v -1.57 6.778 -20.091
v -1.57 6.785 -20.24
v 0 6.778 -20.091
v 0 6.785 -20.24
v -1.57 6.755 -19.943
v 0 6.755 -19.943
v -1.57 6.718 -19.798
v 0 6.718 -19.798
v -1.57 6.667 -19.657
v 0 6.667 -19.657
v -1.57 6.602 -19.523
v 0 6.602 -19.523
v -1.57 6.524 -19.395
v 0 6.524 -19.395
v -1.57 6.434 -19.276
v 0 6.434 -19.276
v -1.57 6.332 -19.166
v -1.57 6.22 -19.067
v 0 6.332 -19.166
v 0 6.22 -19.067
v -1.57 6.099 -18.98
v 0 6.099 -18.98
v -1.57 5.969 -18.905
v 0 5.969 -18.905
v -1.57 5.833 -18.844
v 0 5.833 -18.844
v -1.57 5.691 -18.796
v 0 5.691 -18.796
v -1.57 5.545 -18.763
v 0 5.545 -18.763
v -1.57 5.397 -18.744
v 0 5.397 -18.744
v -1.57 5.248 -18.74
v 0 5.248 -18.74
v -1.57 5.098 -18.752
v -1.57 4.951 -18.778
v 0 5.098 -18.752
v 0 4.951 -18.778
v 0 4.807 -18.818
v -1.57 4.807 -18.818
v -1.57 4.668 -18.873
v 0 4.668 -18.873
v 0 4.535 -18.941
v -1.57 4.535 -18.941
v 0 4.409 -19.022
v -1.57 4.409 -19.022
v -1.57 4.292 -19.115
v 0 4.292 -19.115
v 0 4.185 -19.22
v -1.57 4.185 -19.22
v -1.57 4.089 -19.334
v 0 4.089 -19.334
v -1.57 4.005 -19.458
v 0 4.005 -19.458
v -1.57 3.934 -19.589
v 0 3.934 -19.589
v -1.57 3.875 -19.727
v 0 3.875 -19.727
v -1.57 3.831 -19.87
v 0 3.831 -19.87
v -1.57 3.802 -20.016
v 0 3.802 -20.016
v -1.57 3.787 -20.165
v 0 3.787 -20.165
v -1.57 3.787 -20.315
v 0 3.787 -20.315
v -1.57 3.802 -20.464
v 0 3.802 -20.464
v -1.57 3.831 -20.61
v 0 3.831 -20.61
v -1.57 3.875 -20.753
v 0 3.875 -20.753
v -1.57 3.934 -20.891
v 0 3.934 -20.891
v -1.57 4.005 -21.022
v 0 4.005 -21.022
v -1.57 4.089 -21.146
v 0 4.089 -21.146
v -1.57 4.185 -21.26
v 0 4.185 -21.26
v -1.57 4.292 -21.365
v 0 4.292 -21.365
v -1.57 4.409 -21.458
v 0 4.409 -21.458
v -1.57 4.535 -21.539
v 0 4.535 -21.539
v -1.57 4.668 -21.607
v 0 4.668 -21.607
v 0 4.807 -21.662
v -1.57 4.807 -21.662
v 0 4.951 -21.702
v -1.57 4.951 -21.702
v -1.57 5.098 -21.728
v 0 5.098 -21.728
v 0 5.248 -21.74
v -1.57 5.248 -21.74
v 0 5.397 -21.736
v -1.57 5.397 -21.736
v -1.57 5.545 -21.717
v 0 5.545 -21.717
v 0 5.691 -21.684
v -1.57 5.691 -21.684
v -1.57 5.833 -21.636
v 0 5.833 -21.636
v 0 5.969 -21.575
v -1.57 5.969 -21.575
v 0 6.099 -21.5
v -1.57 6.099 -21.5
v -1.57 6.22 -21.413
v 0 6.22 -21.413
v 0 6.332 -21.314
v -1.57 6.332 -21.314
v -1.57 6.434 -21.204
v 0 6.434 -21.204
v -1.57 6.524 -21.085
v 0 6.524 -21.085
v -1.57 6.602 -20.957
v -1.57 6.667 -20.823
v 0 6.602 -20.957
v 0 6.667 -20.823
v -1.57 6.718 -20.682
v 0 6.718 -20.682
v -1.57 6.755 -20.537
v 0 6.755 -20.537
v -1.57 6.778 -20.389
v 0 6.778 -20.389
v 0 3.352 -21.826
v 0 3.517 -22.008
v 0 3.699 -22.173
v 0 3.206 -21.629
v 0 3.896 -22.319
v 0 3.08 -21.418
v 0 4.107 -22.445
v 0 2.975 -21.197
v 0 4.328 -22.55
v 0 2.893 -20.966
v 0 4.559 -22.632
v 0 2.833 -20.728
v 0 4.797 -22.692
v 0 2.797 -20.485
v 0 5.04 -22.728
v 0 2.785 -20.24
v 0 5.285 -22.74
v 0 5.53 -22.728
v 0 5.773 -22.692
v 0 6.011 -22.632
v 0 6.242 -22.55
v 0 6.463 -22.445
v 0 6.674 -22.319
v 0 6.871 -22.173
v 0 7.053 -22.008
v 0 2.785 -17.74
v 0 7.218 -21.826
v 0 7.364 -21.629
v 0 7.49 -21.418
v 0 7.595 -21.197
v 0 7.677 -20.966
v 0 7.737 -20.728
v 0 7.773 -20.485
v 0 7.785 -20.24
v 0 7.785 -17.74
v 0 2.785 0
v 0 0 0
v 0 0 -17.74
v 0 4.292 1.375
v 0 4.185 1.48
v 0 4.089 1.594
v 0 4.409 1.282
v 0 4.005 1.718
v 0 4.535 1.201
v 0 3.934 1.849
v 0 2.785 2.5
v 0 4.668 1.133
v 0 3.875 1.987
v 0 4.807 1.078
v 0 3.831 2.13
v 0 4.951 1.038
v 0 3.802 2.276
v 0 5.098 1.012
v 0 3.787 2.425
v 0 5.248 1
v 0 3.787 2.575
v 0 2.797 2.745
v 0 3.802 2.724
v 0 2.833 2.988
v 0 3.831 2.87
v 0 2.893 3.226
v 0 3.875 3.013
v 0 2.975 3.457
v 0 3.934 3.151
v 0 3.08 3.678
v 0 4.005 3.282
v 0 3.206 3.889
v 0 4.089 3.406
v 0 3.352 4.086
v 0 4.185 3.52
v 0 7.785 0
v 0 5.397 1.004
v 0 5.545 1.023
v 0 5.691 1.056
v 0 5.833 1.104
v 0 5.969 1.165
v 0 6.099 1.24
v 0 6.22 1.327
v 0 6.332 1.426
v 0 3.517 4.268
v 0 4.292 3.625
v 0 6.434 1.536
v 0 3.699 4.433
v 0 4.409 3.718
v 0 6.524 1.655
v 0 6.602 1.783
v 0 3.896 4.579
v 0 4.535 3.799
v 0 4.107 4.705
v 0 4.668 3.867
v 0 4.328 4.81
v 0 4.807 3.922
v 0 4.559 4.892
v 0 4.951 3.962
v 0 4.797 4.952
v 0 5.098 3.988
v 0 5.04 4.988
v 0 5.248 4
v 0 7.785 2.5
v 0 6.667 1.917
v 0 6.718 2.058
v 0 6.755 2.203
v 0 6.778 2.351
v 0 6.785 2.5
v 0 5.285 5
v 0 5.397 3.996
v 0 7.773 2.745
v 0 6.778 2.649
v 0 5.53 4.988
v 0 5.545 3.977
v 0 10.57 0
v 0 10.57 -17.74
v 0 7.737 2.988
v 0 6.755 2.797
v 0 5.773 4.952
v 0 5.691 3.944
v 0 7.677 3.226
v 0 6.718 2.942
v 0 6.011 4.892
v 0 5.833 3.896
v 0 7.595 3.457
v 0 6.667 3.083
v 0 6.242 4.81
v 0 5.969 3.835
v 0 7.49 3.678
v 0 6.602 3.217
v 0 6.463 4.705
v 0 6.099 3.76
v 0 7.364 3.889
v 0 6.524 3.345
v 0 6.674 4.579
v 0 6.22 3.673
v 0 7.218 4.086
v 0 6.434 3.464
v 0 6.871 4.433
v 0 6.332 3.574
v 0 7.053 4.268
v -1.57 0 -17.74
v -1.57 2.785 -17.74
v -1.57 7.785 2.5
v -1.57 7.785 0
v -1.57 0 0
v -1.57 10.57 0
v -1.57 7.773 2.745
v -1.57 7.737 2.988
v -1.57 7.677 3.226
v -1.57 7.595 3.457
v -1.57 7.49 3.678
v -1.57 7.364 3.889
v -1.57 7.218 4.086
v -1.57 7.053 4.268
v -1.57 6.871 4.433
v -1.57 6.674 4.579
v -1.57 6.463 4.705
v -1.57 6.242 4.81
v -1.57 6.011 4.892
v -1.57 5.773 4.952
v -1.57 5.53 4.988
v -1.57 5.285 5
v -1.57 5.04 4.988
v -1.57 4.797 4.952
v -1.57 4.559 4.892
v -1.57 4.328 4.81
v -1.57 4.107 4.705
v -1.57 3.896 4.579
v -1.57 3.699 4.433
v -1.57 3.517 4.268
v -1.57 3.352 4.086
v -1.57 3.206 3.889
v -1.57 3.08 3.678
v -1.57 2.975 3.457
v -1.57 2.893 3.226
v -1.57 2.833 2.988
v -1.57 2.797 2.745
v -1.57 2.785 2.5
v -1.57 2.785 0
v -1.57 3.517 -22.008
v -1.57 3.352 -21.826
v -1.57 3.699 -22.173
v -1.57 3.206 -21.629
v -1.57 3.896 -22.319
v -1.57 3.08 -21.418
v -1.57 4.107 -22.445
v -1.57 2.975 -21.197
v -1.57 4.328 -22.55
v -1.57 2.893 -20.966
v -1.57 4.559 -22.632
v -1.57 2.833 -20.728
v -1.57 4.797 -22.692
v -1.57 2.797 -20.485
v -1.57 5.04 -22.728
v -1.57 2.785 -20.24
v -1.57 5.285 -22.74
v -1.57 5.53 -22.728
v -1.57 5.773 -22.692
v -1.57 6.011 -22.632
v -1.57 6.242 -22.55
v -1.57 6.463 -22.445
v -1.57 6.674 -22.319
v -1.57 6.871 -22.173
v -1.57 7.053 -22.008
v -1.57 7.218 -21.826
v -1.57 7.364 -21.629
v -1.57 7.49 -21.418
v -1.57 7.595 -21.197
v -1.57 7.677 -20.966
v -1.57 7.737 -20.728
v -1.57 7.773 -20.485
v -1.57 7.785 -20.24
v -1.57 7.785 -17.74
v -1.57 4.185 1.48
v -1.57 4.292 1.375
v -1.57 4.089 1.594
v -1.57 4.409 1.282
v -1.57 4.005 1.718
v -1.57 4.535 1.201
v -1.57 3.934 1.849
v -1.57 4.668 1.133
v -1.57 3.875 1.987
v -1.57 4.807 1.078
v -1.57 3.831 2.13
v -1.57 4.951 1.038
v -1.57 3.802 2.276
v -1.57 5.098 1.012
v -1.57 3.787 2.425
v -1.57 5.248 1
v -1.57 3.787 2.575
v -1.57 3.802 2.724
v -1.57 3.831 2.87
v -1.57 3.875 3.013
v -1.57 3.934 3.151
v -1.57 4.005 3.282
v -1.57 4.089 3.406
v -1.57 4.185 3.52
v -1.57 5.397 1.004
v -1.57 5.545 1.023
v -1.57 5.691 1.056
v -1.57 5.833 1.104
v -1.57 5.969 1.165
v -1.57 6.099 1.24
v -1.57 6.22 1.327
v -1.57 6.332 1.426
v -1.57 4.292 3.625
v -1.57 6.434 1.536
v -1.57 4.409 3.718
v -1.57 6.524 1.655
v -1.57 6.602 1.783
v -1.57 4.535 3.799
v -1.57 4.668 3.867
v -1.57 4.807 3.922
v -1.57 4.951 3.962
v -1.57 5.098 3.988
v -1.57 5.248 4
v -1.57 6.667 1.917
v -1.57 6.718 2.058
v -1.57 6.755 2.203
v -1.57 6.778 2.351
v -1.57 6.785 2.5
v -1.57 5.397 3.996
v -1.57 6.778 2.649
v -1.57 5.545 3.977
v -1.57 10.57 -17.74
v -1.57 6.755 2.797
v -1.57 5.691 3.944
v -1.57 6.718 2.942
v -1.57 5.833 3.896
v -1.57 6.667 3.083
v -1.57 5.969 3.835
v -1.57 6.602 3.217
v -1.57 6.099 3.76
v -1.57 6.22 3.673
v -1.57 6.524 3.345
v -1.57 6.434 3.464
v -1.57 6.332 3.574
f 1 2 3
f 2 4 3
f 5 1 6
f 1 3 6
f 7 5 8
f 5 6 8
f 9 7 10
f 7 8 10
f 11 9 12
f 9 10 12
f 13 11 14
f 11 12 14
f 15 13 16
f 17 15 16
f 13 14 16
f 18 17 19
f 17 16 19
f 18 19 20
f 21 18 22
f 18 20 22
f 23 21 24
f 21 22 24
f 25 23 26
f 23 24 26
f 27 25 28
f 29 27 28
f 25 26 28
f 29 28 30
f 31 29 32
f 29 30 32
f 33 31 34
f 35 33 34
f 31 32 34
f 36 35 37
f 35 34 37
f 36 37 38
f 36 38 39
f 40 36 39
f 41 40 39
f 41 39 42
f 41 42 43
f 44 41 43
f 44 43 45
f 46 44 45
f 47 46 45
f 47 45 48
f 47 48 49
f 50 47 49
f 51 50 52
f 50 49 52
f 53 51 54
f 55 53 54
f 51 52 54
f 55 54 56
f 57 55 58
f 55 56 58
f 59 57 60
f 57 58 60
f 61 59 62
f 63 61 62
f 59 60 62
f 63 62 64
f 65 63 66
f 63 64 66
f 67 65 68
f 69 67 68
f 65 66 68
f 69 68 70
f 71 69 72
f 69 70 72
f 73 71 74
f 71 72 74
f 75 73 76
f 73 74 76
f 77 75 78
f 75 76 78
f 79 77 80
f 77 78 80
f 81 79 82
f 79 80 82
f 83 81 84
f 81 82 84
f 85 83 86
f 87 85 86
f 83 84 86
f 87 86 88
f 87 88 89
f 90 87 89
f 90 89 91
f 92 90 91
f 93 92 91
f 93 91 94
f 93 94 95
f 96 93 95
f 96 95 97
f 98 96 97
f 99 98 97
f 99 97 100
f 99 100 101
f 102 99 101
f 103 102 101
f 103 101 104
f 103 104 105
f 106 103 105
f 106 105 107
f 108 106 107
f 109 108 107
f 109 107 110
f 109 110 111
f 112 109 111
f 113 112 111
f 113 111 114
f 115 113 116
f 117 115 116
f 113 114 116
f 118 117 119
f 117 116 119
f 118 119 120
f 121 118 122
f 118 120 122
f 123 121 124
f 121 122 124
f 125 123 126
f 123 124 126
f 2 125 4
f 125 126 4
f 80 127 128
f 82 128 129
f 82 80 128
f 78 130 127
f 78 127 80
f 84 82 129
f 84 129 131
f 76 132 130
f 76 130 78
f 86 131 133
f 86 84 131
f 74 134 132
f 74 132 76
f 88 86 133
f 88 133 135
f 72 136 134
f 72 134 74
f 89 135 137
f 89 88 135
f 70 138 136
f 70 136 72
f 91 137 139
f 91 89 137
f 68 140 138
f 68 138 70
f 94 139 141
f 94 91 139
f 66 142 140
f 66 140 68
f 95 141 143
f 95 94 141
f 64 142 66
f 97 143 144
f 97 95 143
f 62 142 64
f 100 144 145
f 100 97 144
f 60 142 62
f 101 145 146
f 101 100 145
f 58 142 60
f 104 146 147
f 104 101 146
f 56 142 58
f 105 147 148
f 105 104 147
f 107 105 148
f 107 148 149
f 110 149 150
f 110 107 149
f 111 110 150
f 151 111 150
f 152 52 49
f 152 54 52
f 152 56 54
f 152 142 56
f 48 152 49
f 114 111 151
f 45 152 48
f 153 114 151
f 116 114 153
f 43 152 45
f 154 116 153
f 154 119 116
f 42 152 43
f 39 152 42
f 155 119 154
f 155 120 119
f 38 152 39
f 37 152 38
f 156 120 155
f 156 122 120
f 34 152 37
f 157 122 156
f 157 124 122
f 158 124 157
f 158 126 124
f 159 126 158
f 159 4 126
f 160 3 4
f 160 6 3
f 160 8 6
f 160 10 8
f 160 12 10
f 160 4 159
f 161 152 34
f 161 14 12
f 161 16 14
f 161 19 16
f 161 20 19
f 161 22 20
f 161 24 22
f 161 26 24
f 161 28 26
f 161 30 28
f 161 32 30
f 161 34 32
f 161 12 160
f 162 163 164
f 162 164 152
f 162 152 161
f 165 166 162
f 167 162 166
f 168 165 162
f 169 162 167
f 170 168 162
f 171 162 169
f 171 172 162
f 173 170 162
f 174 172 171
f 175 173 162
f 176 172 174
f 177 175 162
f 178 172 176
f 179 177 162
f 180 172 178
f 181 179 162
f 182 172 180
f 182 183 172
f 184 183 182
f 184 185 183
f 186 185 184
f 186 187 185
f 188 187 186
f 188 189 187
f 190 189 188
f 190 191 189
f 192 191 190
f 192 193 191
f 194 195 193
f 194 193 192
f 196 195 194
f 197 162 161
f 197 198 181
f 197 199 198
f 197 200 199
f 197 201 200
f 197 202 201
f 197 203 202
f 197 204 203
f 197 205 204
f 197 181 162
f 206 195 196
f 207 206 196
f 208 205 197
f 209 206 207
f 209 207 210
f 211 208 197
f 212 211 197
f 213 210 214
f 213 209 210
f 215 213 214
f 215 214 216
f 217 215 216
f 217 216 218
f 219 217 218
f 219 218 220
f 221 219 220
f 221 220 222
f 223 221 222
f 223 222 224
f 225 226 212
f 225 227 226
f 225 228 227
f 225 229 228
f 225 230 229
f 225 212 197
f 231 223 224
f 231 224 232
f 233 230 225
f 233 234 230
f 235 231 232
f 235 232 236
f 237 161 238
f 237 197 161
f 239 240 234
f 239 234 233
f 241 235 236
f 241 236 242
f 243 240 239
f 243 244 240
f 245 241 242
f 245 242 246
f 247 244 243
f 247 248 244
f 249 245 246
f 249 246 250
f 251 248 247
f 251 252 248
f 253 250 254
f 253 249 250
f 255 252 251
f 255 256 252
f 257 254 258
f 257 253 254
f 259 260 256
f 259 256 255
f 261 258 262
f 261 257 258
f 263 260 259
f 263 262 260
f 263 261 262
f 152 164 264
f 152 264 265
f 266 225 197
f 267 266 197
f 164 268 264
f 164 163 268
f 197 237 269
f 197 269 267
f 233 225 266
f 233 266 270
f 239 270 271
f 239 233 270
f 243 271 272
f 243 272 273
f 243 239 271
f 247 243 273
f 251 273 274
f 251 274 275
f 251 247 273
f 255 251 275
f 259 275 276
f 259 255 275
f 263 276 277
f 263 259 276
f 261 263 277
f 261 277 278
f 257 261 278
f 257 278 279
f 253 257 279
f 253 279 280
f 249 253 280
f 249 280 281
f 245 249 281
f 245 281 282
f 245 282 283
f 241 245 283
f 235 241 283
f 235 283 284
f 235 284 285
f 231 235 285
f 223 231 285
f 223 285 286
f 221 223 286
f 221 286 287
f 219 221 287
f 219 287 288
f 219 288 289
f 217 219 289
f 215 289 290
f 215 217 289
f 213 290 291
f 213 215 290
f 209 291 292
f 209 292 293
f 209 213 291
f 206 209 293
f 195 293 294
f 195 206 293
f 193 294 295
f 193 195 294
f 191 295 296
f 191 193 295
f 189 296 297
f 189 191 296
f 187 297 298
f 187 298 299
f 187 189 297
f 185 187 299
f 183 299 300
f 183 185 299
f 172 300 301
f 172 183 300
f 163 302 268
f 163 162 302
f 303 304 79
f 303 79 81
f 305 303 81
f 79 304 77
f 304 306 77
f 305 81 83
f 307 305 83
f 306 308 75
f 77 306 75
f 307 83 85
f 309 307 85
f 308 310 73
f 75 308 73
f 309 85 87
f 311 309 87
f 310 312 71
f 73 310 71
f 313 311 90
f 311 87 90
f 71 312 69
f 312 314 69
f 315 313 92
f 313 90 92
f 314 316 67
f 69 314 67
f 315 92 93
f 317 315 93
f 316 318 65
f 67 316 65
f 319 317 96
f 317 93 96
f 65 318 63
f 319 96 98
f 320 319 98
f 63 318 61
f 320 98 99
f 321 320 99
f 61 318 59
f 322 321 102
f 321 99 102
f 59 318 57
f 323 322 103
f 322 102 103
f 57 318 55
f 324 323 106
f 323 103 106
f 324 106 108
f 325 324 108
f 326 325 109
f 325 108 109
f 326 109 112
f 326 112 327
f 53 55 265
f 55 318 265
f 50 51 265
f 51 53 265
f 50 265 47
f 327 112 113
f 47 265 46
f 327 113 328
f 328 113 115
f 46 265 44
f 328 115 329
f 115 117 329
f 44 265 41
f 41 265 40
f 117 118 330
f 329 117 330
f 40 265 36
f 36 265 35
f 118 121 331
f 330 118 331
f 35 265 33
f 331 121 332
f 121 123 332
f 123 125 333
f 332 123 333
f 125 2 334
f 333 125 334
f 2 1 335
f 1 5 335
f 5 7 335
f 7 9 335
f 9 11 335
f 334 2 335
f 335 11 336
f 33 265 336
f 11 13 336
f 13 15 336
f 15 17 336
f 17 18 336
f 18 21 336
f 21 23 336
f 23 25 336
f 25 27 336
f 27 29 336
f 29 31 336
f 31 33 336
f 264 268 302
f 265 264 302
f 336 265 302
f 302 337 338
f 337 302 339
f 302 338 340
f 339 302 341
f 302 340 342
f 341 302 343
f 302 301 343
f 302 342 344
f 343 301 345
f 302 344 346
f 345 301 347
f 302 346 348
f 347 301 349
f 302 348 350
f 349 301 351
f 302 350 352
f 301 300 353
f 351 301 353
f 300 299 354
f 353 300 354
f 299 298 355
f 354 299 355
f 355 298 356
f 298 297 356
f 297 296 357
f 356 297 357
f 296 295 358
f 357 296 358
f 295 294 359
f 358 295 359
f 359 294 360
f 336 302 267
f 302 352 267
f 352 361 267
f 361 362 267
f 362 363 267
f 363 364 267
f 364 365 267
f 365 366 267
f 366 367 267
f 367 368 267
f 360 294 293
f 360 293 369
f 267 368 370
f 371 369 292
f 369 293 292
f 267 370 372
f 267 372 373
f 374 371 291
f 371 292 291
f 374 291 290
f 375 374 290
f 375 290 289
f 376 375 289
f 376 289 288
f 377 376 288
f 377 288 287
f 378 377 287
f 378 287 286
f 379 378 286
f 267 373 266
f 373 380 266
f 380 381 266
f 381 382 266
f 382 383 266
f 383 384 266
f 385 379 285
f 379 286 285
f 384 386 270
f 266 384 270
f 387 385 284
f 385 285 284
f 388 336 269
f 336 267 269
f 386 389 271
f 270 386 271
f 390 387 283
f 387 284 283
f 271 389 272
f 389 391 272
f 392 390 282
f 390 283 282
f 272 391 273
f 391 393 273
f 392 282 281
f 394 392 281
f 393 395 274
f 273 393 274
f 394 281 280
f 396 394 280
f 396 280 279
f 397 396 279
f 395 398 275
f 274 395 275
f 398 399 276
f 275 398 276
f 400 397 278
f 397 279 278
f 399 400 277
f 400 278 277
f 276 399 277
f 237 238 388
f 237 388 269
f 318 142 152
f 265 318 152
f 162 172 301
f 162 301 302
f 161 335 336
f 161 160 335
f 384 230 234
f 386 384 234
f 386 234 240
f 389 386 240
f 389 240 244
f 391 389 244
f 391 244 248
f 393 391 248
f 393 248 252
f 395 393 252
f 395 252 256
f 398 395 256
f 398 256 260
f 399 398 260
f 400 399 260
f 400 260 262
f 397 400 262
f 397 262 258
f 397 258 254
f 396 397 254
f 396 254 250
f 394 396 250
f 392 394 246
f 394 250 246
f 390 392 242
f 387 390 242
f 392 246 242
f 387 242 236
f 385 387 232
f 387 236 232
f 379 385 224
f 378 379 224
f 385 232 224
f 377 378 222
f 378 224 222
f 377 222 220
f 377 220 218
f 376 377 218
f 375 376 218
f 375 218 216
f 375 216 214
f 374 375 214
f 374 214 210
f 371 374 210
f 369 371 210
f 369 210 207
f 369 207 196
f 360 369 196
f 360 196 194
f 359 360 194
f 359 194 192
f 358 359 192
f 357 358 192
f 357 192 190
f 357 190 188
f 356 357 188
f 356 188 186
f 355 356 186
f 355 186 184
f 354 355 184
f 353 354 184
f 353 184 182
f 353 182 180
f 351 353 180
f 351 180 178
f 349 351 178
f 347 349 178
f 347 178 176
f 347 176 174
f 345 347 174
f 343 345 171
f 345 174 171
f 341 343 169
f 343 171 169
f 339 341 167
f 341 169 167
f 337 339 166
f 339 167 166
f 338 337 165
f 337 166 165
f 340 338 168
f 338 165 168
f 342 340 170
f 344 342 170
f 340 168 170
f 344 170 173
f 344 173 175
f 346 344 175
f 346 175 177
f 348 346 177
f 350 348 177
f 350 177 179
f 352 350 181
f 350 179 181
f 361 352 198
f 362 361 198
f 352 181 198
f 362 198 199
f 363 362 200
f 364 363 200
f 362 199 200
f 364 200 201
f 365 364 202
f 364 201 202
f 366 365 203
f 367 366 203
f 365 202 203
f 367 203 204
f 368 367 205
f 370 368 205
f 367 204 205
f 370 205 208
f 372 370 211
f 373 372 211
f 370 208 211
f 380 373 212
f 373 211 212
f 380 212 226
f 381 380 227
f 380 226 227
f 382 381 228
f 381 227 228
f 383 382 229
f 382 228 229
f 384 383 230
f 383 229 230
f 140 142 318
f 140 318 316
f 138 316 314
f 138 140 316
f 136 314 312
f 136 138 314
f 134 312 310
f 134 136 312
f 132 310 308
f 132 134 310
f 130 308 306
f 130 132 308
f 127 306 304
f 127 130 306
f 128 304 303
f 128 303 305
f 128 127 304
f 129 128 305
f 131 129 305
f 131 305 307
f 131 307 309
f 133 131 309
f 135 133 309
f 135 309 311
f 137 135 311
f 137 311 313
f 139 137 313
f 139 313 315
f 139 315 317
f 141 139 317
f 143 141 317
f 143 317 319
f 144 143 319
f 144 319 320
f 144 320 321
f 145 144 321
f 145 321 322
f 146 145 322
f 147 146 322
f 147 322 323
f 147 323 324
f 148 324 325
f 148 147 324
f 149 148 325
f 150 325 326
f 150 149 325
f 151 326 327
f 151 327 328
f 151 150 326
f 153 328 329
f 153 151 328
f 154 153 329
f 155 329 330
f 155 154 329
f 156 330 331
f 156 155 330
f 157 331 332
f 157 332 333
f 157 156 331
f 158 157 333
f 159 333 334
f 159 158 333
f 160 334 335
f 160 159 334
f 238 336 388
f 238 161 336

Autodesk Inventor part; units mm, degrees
ref_plane "YZ Plane" through (0, 0, 0) normal (1, 0, 0) x (0, 1, 0)
ref_plane "XZ Plane" through (0, 0, 0) normal (0, 1, 0) x (-1, 0, 0)
ref_plane "XY Plane" through (0, 0, 0) normal (0, 0, 1) x (1, 0, 0)
sketch "Sketch1" plane through (0, 0, 0) normal (1, 0, 0) x (0, 1, 0)
  line L0 (10.57, 0) -> (0, 0)
  line L1 (0, 0) -> (0, -17.74)
  line L2 (0, -17.74) -> (10.57, -17.74)
  line L3 (10.57, -17.74) -> (10.57, 0)
  circle A0 centre (5.285, 2.5) radius 2.5
  circle A1 centre (5.285, 2.5) radius 1.5
  line L4 (10.57, -8.87) -> (0, -8.87) construction
  circle A2 centre (5.285, -20.24) radius 2.5
  circle A3 centre (5.285, -20.24) radius 1.5
  line L5 (7.785, 2.5) -> (7.785, 0)
  line L6 (2.785, 2.5) -> (2.785, 0)
  line L7 (7.785, -20.24) -> (7.785, -17.74)
  line L8 (2.785, -20.24) -> (2.785, -17.74)
  dimension "d0" = 17.74
  dimension "d1" = 10.57
  dimension "d2" = 5.285
  dimension "d3" = 5
  dimension "d11" = 3
extrude "Extrusion1" add sketch "Sketch1" against normal blind 1.57
properties part number "VL53L1X board"
